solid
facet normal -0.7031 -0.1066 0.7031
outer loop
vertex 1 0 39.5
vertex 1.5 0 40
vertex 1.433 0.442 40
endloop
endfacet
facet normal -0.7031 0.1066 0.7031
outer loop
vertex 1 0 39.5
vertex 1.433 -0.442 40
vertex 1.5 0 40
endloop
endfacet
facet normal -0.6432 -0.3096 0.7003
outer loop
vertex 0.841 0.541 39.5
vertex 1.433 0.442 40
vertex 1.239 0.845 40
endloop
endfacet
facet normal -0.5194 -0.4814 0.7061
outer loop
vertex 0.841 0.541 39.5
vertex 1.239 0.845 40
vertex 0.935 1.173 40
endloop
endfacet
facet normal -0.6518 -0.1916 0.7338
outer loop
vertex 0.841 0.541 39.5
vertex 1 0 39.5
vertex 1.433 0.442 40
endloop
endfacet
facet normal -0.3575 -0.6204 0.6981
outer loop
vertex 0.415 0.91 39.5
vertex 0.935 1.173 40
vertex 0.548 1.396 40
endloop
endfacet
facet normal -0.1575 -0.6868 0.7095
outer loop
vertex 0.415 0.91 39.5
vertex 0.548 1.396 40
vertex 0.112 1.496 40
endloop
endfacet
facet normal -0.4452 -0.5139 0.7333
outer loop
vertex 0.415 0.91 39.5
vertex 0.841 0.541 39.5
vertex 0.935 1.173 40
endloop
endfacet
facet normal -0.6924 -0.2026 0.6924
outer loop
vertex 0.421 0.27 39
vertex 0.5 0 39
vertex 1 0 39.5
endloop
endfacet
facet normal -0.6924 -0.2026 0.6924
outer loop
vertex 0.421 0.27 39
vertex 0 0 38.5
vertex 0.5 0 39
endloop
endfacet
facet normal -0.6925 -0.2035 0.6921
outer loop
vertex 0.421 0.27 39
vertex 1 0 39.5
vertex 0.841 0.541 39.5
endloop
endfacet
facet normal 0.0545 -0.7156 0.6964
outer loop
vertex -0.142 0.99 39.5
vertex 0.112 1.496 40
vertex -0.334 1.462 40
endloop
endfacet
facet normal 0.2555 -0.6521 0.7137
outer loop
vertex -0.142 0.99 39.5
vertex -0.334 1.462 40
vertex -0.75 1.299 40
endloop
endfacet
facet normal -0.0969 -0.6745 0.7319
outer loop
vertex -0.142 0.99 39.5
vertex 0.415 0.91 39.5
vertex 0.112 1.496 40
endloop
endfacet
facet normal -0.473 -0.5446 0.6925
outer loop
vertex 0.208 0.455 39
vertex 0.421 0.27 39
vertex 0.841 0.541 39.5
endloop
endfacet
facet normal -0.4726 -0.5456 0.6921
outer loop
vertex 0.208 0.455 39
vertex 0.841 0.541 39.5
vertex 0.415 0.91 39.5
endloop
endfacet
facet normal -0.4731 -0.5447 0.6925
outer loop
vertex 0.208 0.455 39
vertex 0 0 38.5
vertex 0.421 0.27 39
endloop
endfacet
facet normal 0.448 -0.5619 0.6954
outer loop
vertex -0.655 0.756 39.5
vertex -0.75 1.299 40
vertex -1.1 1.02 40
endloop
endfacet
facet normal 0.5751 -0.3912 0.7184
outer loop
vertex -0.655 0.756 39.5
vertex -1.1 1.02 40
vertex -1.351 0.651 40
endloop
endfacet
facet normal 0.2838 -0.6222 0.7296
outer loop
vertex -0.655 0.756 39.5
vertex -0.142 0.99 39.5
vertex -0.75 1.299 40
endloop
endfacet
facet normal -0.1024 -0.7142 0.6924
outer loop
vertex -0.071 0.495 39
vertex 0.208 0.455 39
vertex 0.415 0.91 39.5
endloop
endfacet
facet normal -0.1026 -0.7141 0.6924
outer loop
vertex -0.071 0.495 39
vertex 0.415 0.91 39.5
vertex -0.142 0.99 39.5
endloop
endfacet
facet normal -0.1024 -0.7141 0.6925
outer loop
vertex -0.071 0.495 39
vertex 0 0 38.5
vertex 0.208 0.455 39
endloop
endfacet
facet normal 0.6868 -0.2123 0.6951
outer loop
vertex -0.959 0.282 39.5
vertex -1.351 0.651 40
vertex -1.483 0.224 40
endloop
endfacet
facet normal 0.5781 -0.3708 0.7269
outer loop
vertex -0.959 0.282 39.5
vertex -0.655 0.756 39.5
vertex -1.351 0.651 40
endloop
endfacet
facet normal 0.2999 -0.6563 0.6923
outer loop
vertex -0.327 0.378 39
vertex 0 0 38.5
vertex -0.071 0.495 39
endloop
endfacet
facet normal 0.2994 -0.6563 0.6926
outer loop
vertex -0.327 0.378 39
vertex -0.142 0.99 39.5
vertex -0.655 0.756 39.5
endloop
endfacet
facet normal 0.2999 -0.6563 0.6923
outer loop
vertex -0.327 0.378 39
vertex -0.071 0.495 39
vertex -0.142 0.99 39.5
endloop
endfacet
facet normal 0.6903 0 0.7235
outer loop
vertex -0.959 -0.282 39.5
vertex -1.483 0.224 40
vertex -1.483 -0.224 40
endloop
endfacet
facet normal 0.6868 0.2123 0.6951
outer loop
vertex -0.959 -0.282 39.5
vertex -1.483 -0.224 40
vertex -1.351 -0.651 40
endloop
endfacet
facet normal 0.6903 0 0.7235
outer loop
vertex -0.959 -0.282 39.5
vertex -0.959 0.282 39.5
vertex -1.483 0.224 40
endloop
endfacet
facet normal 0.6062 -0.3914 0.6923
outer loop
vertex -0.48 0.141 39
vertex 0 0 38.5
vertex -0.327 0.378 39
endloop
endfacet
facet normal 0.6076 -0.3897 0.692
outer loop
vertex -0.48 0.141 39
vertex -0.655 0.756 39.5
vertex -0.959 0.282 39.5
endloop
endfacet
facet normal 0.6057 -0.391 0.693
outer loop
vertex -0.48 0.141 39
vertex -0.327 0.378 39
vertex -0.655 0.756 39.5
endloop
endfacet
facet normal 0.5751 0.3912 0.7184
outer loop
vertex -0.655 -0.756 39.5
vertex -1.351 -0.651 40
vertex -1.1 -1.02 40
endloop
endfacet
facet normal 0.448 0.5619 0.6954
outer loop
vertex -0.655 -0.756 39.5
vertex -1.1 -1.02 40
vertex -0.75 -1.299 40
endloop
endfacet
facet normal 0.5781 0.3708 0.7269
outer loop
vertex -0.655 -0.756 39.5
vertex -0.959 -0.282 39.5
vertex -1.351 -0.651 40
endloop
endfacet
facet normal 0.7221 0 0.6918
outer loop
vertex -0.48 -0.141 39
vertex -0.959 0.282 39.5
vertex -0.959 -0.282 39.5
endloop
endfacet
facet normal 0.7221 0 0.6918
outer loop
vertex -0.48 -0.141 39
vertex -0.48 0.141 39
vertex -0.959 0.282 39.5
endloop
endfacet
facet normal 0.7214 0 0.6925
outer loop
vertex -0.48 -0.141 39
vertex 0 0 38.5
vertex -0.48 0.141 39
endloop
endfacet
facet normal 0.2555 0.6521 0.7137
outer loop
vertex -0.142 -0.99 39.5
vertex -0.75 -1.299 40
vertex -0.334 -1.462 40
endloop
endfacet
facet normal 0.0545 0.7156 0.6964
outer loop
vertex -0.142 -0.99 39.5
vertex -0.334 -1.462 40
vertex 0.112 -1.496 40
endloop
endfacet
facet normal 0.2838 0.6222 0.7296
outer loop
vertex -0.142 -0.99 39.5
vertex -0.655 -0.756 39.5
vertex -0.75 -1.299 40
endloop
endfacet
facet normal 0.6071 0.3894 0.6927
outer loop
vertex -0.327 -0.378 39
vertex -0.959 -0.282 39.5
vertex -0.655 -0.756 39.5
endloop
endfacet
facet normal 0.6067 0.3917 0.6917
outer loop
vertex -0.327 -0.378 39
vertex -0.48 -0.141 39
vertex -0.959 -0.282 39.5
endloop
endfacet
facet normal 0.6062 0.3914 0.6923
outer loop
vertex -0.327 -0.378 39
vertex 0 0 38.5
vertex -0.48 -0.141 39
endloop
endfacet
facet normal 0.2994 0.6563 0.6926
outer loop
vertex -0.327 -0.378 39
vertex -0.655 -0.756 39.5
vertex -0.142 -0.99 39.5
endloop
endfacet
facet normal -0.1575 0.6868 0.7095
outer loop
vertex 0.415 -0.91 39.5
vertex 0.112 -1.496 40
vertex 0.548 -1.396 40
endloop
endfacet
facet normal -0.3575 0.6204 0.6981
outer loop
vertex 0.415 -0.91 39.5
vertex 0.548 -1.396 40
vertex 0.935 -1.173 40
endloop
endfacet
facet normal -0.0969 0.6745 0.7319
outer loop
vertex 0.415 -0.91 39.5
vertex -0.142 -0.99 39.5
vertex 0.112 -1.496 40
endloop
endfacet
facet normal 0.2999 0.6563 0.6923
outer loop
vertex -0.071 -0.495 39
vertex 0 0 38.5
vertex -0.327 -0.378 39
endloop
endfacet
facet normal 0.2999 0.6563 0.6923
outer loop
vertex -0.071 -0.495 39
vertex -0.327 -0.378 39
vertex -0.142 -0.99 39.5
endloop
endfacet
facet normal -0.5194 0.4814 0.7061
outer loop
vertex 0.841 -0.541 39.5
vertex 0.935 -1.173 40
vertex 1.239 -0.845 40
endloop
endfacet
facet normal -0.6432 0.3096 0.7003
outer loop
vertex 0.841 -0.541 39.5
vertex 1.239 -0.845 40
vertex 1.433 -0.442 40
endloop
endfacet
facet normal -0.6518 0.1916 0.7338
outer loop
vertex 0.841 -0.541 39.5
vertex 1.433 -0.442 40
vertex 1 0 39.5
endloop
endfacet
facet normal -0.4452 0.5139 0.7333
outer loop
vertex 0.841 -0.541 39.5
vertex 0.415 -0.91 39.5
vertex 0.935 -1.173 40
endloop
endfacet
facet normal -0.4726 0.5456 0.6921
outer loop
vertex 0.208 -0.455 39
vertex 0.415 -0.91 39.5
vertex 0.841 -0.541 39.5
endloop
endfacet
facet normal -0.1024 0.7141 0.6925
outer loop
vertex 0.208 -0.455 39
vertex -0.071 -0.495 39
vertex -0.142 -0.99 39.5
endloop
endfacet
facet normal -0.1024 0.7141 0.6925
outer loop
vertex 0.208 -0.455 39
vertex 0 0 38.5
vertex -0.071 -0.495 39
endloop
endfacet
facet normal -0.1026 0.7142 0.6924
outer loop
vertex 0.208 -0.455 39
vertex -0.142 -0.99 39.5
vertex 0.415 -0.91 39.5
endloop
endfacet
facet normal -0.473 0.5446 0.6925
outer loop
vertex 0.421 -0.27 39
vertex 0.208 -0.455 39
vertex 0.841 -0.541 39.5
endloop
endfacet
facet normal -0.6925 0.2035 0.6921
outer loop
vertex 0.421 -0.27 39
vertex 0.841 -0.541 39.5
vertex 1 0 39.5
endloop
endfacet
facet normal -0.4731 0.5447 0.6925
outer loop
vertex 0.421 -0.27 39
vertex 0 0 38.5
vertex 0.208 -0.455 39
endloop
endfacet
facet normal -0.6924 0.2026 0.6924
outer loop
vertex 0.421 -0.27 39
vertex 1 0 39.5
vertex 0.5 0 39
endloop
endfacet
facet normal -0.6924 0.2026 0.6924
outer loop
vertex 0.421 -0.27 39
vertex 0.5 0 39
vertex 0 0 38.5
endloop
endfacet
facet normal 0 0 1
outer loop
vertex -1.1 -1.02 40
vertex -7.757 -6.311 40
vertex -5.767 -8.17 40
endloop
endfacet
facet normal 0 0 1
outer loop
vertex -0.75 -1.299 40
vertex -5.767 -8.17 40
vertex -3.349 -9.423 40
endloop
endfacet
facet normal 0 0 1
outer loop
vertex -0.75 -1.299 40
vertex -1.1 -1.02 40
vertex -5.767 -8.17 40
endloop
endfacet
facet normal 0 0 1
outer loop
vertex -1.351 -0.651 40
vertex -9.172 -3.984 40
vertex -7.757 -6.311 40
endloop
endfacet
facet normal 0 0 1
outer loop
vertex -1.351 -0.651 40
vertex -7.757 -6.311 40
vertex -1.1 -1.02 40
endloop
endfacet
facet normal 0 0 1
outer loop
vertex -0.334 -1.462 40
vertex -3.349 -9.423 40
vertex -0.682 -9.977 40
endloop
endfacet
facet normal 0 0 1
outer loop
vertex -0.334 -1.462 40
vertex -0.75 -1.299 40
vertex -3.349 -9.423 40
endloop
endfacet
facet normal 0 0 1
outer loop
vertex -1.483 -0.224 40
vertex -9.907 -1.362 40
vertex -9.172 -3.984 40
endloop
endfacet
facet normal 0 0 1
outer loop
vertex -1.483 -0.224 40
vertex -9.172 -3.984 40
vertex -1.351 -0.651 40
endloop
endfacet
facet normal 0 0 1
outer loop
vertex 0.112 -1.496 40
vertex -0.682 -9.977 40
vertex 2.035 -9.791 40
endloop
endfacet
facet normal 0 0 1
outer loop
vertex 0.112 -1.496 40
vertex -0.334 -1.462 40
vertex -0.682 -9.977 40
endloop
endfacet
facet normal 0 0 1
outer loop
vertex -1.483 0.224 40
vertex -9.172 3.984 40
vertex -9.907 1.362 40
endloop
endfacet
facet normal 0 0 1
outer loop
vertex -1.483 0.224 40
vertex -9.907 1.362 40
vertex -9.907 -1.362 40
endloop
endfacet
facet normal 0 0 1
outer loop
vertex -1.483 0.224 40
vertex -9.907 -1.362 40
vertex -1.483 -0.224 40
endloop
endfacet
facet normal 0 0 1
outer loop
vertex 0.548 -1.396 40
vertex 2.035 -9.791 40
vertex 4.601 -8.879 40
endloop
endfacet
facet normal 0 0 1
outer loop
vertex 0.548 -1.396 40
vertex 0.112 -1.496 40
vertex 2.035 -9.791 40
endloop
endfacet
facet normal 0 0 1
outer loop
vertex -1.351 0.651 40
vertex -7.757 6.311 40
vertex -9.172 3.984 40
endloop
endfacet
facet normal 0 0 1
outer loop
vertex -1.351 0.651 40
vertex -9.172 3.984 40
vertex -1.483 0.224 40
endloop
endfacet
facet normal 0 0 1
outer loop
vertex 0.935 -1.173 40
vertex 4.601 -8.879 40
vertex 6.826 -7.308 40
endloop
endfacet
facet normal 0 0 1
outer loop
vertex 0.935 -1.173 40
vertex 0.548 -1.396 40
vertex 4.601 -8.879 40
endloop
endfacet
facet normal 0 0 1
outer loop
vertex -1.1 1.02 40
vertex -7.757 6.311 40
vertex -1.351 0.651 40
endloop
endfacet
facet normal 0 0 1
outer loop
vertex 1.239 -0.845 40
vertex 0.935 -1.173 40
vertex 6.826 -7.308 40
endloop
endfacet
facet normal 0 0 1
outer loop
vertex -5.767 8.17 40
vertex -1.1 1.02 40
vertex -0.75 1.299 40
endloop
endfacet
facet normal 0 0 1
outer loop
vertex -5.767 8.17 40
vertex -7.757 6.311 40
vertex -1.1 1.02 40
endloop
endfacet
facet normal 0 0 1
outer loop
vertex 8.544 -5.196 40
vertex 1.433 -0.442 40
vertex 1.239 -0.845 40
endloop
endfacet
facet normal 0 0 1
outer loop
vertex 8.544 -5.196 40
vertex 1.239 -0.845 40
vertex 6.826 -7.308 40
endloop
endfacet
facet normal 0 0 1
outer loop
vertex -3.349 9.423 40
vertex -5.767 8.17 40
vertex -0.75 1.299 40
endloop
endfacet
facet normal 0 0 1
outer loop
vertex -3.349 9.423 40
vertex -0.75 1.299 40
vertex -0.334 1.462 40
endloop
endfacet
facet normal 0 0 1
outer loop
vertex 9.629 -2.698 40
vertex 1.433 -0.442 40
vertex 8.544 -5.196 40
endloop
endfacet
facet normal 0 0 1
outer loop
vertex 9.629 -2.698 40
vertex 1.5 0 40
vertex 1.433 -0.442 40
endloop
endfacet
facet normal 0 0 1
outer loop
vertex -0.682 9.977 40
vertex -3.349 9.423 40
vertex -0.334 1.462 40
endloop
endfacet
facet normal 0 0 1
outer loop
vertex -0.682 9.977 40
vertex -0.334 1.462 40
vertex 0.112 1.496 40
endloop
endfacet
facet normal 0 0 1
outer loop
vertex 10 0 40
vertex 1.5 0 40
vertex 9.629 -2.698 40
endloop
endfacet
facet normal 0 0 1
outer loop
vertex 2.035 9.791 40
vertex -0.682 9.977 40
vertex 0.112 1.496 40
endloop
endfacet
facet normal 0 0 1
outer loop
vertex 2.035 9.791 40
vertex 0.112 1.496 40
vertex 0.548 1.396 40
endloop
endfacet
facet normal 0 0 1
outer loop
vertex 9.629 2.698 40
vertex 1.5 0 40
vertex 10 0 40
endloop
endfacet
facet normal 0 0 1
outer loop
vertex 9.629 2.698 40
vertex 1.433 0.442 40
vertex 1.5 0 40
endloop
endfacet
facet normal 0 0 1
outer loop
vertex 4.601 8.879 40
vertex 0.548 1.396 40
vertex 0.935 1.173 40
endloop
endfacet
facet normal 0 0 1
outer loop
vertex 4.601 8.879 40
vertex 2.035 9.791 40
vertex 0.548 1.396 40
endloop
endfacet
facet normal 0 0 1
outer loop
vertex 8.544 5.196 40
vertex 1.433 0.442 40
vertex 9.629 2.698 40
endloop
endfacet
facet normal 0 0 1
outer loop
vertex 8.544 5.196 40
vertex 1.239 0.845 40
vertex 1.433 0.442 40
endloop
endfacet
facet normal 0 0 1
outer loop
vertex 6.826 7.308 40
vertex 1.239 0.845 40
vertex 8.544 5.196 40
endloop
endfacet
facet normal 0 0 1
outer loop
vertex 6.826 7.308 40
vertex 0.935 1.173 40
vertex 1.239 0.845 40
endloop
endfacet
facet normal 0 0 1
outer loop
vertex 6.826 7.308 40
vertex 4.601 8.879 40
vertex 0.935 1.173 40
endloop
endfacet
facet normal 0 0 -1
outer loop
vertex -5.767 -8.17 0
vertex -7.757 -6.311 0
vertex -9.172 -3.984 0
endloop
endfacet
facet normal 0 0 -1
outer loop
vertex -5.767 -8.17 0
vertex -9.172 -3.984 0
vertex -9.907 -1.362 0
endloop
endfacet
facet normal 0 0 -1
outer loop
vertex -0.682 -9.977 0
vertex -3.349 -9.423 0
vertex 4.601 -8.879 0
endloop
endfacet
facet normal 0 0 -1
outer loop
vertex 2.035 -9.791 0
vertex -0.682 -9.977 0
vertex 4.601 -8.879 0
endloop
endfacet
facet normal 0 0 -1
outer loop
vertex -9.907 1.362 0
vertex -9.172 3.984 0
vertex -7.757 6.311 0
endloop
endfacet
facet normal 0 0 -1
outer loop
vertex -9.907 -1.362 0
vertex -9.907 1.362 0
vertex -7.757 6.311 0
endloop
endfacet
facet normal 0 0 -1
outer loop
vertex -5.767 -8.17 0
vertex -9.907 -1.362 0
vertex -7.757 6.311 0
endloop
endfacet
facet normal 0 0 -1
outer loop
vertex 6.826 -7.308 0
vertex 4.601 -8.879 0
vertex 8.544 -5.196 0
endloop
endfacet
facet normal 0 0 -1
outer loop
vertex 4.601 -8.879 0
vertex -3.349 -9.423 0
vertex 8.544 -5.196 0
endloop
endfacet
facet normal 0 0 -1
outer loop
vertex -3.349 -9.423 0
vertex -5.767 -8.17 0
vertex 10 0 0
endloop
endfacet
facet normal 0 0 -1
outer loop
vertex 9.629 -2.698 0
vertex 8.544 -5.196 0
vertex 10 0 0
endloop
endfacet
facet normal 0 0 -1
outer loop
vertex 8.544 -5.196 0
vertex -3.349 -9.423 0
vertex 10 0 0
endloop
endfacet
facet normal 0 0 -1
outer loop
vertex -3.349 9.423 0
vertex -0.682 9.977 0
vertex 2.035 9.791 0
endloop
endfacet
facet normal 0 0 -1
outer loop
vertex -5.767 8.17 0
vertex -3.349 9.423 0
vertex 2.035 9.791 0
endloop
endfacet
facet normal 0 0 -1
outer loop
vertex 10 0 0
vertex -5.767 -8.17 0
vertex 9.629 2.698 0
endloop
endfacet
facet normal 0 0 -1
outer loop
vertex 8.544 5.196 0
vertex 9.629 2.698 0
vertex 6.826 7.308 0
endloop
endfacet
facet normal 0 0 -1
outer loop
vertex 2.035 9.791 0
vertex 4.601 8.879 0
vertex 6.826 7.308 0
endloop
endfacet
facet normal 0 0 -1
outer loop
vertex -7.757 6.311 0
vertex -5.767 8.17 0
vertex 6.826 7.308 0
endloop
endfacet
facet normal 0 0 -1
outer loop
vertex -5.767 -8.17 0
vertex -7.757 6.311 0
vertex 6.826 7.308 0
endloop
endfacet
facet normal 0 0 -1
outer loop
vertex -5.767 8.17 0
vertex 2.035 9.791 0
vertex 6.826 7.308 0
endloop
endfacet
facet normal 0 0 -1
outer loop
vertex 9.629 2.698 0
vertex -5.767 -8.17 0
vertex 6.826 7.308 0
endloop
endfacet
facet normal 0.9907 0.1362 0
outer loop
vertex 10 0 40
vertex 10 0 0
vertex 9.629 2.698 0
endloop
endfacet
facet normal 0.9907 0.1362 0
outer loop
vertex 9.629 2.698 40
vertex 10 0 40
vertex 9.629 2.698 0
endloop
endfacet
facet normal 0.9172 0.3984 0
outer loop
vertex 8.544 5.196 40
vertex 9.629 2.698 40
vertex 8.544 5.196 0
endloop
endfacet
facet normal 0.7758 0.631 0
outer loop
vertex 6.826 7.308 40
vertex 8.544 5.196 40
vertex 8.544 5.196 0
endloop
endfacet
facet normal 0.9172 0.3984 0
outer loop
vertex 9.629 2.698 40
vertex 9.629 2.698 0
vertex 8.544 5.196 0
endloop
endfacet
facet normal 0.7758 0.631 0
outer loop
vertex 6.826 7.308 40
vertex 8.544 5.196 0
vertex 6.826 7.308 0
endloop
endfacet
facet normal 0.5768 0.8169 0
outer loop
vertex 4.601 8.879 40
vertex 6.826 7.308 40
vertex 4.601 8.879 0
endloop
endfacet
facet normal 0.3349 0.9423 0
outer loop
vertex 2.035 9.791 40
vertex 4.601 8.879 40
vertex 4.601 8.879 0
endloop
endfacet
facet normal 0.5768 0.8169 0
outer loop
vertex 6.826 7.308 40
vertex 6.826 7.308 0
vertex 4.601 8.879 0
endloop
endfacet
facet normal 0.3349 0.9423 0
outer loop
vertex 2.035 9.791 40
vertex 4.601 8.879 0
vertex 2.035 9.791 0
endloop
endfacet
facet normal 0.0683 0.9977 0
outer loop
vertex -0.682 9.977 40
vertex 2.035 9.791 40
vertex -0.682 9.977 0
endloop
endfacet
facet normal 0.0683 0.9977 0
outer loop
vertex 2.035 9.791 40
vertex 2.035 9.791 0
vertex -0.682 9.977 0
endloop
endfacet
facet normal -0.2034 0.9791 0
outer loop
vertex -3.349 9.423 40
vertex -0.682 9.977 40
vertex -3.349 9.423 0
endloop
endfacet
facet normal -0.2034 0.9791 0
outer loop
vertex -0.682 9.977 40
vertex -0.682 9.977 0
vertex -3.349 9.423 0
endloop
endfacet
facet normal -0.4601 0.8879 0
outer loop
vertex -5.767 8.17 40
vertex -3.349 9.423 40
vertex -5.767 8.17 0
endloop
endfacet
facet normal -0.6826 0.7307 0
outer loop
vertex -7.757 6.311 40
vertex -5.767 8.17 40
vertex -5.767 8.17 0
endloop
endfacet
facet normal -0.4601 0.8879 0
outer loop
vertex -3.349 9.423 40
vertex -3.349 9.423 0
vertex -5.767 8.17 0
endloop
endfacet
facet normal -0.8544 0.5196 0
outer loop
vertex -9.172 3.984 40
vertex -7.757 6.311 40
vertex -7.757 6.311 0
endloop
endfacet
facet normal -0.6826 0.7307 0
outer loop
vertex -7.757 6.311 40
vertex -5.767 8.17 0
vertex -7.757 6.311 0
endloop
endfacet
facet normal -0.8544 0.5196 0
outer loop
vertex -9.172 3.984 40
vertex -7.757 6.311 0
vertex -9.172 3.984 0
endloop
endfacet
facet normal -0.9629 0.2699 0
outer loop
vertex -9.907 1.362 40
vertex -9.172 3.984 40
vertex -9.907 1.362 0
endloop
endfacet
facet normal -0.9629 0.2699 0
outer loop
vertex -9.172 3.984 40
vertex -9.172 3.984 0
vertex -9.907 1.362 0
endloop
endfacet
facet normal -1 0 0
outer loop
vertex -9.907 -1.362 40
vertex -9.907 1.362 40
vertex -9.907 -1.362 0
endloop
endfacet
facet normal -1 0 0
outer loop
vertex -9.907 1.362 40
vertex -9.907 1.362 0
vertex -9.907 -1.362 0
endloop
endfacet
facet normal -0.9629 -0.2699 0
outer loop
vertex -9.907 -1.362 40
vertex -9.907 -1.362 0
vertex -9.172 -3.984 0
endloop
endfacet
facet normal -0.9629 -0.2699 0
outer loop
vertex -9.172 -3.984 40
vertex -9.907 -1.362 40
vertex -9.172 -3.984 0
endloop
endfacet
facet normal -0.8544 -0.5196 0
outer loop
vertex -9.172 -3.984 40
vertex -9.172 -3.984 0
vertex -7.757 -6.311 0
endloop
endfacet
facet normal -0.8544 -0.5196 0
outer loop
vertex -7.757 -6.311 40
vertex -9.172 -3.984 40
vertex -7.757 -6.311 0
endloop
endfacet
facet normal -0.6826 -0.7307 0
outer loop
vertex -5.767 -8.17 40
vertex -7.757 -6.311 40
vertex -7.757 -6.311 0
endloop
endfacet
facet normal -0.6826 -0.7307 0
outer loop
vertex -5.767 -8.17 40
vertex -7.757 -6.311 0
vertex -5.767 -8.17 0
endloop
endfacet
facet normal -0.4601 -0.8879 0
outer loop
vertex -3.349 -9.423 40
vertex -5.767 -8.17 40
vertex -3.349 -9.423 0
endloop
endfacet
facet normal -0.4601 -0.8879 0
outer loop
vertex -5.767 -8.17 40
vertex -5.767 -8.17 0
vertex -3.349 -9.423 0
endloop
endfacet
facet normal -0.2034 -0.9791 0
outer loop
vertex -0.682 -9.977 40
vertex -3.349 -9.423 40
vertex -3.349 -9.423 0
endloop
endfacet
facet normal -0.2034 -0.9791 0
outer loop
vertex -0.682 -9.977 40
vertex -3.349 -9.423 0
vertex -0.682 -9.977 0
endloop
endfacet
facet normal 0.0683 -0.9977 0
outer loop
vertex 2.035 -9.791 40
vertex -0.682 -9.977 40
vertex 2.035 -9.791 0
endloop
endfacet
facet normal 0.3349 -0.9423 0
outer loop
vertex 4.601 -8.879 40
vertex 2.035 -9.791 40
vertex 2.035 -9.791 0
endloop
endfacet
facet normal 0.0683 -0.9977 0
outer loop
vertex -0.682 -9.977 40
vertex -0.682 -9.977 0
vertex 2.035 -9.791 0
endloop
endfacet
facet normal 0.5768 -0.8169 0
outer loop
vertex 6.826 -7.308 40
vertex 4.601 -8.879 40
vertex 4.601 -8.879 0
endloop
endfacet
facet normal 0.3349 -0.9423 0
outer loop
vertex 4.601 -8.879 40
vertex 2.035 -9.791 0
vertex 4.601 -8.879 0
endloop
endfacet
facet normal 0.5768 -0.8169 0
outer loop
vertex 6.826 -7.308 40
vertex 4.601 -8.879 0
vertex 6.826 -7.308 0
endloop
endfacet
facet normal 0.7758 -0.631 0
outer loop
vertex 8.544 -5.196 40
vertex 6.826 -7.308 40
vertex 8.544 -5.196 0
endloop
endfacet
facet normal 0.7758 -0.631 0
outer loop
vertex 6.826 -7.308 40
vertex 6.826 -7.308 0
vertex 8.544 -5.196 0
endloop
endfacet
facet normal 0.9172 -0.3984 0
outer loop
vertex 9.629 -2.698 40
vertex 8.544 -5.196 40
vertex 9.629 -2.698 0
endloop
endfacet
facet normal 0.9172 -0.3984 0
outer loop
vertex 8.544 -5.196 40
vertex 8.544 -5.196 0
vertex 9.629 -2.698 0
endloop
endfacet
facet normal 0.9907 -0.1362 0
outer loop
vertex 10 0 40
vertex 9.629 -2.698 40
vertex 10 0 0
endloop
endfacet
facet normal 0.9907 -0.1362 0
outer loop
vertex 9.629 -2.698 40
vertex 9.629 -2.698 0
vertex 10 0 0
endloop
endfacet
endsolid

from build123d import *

# Parameters (mm, degrees)
F0_R     = 10
F1_DEPTH = 40
F2_R     = 1.5
F3_DEPTH = 1.5
F4_SIZE  = 1.49999


# Not quite as in the source:
# - a fillet or chamfer is up to 0.001 mm smaller than in the source, because OpenCascade refuses the exact size


with BuildPart() as f1:
    # F0 (on Top) → F1 (new body)
    with BuildSketch(Plane.XY):
        Circle(F0_R)
    extrude(amount=F1_DEPTH)

    # F2 (on face) → F3 (cut)
    with BuildSketch(Plane.XY.offset(40)):
        Circle(F2_R)
    extrude(amount=-F3_DEPTH, mode=Mode.SUBTRACT)

    # F4 (size 1.5 in the source; OpenCascade refuses exactly that, so slightly less here)
    f4_edges = [f1.edges().sort_by_distance(p)[0] for p in [
        (-1.5, 0, 38.5),
    ]]
    chamfer(f4_edges, length=F4_SIZE)


solid = f1.part
